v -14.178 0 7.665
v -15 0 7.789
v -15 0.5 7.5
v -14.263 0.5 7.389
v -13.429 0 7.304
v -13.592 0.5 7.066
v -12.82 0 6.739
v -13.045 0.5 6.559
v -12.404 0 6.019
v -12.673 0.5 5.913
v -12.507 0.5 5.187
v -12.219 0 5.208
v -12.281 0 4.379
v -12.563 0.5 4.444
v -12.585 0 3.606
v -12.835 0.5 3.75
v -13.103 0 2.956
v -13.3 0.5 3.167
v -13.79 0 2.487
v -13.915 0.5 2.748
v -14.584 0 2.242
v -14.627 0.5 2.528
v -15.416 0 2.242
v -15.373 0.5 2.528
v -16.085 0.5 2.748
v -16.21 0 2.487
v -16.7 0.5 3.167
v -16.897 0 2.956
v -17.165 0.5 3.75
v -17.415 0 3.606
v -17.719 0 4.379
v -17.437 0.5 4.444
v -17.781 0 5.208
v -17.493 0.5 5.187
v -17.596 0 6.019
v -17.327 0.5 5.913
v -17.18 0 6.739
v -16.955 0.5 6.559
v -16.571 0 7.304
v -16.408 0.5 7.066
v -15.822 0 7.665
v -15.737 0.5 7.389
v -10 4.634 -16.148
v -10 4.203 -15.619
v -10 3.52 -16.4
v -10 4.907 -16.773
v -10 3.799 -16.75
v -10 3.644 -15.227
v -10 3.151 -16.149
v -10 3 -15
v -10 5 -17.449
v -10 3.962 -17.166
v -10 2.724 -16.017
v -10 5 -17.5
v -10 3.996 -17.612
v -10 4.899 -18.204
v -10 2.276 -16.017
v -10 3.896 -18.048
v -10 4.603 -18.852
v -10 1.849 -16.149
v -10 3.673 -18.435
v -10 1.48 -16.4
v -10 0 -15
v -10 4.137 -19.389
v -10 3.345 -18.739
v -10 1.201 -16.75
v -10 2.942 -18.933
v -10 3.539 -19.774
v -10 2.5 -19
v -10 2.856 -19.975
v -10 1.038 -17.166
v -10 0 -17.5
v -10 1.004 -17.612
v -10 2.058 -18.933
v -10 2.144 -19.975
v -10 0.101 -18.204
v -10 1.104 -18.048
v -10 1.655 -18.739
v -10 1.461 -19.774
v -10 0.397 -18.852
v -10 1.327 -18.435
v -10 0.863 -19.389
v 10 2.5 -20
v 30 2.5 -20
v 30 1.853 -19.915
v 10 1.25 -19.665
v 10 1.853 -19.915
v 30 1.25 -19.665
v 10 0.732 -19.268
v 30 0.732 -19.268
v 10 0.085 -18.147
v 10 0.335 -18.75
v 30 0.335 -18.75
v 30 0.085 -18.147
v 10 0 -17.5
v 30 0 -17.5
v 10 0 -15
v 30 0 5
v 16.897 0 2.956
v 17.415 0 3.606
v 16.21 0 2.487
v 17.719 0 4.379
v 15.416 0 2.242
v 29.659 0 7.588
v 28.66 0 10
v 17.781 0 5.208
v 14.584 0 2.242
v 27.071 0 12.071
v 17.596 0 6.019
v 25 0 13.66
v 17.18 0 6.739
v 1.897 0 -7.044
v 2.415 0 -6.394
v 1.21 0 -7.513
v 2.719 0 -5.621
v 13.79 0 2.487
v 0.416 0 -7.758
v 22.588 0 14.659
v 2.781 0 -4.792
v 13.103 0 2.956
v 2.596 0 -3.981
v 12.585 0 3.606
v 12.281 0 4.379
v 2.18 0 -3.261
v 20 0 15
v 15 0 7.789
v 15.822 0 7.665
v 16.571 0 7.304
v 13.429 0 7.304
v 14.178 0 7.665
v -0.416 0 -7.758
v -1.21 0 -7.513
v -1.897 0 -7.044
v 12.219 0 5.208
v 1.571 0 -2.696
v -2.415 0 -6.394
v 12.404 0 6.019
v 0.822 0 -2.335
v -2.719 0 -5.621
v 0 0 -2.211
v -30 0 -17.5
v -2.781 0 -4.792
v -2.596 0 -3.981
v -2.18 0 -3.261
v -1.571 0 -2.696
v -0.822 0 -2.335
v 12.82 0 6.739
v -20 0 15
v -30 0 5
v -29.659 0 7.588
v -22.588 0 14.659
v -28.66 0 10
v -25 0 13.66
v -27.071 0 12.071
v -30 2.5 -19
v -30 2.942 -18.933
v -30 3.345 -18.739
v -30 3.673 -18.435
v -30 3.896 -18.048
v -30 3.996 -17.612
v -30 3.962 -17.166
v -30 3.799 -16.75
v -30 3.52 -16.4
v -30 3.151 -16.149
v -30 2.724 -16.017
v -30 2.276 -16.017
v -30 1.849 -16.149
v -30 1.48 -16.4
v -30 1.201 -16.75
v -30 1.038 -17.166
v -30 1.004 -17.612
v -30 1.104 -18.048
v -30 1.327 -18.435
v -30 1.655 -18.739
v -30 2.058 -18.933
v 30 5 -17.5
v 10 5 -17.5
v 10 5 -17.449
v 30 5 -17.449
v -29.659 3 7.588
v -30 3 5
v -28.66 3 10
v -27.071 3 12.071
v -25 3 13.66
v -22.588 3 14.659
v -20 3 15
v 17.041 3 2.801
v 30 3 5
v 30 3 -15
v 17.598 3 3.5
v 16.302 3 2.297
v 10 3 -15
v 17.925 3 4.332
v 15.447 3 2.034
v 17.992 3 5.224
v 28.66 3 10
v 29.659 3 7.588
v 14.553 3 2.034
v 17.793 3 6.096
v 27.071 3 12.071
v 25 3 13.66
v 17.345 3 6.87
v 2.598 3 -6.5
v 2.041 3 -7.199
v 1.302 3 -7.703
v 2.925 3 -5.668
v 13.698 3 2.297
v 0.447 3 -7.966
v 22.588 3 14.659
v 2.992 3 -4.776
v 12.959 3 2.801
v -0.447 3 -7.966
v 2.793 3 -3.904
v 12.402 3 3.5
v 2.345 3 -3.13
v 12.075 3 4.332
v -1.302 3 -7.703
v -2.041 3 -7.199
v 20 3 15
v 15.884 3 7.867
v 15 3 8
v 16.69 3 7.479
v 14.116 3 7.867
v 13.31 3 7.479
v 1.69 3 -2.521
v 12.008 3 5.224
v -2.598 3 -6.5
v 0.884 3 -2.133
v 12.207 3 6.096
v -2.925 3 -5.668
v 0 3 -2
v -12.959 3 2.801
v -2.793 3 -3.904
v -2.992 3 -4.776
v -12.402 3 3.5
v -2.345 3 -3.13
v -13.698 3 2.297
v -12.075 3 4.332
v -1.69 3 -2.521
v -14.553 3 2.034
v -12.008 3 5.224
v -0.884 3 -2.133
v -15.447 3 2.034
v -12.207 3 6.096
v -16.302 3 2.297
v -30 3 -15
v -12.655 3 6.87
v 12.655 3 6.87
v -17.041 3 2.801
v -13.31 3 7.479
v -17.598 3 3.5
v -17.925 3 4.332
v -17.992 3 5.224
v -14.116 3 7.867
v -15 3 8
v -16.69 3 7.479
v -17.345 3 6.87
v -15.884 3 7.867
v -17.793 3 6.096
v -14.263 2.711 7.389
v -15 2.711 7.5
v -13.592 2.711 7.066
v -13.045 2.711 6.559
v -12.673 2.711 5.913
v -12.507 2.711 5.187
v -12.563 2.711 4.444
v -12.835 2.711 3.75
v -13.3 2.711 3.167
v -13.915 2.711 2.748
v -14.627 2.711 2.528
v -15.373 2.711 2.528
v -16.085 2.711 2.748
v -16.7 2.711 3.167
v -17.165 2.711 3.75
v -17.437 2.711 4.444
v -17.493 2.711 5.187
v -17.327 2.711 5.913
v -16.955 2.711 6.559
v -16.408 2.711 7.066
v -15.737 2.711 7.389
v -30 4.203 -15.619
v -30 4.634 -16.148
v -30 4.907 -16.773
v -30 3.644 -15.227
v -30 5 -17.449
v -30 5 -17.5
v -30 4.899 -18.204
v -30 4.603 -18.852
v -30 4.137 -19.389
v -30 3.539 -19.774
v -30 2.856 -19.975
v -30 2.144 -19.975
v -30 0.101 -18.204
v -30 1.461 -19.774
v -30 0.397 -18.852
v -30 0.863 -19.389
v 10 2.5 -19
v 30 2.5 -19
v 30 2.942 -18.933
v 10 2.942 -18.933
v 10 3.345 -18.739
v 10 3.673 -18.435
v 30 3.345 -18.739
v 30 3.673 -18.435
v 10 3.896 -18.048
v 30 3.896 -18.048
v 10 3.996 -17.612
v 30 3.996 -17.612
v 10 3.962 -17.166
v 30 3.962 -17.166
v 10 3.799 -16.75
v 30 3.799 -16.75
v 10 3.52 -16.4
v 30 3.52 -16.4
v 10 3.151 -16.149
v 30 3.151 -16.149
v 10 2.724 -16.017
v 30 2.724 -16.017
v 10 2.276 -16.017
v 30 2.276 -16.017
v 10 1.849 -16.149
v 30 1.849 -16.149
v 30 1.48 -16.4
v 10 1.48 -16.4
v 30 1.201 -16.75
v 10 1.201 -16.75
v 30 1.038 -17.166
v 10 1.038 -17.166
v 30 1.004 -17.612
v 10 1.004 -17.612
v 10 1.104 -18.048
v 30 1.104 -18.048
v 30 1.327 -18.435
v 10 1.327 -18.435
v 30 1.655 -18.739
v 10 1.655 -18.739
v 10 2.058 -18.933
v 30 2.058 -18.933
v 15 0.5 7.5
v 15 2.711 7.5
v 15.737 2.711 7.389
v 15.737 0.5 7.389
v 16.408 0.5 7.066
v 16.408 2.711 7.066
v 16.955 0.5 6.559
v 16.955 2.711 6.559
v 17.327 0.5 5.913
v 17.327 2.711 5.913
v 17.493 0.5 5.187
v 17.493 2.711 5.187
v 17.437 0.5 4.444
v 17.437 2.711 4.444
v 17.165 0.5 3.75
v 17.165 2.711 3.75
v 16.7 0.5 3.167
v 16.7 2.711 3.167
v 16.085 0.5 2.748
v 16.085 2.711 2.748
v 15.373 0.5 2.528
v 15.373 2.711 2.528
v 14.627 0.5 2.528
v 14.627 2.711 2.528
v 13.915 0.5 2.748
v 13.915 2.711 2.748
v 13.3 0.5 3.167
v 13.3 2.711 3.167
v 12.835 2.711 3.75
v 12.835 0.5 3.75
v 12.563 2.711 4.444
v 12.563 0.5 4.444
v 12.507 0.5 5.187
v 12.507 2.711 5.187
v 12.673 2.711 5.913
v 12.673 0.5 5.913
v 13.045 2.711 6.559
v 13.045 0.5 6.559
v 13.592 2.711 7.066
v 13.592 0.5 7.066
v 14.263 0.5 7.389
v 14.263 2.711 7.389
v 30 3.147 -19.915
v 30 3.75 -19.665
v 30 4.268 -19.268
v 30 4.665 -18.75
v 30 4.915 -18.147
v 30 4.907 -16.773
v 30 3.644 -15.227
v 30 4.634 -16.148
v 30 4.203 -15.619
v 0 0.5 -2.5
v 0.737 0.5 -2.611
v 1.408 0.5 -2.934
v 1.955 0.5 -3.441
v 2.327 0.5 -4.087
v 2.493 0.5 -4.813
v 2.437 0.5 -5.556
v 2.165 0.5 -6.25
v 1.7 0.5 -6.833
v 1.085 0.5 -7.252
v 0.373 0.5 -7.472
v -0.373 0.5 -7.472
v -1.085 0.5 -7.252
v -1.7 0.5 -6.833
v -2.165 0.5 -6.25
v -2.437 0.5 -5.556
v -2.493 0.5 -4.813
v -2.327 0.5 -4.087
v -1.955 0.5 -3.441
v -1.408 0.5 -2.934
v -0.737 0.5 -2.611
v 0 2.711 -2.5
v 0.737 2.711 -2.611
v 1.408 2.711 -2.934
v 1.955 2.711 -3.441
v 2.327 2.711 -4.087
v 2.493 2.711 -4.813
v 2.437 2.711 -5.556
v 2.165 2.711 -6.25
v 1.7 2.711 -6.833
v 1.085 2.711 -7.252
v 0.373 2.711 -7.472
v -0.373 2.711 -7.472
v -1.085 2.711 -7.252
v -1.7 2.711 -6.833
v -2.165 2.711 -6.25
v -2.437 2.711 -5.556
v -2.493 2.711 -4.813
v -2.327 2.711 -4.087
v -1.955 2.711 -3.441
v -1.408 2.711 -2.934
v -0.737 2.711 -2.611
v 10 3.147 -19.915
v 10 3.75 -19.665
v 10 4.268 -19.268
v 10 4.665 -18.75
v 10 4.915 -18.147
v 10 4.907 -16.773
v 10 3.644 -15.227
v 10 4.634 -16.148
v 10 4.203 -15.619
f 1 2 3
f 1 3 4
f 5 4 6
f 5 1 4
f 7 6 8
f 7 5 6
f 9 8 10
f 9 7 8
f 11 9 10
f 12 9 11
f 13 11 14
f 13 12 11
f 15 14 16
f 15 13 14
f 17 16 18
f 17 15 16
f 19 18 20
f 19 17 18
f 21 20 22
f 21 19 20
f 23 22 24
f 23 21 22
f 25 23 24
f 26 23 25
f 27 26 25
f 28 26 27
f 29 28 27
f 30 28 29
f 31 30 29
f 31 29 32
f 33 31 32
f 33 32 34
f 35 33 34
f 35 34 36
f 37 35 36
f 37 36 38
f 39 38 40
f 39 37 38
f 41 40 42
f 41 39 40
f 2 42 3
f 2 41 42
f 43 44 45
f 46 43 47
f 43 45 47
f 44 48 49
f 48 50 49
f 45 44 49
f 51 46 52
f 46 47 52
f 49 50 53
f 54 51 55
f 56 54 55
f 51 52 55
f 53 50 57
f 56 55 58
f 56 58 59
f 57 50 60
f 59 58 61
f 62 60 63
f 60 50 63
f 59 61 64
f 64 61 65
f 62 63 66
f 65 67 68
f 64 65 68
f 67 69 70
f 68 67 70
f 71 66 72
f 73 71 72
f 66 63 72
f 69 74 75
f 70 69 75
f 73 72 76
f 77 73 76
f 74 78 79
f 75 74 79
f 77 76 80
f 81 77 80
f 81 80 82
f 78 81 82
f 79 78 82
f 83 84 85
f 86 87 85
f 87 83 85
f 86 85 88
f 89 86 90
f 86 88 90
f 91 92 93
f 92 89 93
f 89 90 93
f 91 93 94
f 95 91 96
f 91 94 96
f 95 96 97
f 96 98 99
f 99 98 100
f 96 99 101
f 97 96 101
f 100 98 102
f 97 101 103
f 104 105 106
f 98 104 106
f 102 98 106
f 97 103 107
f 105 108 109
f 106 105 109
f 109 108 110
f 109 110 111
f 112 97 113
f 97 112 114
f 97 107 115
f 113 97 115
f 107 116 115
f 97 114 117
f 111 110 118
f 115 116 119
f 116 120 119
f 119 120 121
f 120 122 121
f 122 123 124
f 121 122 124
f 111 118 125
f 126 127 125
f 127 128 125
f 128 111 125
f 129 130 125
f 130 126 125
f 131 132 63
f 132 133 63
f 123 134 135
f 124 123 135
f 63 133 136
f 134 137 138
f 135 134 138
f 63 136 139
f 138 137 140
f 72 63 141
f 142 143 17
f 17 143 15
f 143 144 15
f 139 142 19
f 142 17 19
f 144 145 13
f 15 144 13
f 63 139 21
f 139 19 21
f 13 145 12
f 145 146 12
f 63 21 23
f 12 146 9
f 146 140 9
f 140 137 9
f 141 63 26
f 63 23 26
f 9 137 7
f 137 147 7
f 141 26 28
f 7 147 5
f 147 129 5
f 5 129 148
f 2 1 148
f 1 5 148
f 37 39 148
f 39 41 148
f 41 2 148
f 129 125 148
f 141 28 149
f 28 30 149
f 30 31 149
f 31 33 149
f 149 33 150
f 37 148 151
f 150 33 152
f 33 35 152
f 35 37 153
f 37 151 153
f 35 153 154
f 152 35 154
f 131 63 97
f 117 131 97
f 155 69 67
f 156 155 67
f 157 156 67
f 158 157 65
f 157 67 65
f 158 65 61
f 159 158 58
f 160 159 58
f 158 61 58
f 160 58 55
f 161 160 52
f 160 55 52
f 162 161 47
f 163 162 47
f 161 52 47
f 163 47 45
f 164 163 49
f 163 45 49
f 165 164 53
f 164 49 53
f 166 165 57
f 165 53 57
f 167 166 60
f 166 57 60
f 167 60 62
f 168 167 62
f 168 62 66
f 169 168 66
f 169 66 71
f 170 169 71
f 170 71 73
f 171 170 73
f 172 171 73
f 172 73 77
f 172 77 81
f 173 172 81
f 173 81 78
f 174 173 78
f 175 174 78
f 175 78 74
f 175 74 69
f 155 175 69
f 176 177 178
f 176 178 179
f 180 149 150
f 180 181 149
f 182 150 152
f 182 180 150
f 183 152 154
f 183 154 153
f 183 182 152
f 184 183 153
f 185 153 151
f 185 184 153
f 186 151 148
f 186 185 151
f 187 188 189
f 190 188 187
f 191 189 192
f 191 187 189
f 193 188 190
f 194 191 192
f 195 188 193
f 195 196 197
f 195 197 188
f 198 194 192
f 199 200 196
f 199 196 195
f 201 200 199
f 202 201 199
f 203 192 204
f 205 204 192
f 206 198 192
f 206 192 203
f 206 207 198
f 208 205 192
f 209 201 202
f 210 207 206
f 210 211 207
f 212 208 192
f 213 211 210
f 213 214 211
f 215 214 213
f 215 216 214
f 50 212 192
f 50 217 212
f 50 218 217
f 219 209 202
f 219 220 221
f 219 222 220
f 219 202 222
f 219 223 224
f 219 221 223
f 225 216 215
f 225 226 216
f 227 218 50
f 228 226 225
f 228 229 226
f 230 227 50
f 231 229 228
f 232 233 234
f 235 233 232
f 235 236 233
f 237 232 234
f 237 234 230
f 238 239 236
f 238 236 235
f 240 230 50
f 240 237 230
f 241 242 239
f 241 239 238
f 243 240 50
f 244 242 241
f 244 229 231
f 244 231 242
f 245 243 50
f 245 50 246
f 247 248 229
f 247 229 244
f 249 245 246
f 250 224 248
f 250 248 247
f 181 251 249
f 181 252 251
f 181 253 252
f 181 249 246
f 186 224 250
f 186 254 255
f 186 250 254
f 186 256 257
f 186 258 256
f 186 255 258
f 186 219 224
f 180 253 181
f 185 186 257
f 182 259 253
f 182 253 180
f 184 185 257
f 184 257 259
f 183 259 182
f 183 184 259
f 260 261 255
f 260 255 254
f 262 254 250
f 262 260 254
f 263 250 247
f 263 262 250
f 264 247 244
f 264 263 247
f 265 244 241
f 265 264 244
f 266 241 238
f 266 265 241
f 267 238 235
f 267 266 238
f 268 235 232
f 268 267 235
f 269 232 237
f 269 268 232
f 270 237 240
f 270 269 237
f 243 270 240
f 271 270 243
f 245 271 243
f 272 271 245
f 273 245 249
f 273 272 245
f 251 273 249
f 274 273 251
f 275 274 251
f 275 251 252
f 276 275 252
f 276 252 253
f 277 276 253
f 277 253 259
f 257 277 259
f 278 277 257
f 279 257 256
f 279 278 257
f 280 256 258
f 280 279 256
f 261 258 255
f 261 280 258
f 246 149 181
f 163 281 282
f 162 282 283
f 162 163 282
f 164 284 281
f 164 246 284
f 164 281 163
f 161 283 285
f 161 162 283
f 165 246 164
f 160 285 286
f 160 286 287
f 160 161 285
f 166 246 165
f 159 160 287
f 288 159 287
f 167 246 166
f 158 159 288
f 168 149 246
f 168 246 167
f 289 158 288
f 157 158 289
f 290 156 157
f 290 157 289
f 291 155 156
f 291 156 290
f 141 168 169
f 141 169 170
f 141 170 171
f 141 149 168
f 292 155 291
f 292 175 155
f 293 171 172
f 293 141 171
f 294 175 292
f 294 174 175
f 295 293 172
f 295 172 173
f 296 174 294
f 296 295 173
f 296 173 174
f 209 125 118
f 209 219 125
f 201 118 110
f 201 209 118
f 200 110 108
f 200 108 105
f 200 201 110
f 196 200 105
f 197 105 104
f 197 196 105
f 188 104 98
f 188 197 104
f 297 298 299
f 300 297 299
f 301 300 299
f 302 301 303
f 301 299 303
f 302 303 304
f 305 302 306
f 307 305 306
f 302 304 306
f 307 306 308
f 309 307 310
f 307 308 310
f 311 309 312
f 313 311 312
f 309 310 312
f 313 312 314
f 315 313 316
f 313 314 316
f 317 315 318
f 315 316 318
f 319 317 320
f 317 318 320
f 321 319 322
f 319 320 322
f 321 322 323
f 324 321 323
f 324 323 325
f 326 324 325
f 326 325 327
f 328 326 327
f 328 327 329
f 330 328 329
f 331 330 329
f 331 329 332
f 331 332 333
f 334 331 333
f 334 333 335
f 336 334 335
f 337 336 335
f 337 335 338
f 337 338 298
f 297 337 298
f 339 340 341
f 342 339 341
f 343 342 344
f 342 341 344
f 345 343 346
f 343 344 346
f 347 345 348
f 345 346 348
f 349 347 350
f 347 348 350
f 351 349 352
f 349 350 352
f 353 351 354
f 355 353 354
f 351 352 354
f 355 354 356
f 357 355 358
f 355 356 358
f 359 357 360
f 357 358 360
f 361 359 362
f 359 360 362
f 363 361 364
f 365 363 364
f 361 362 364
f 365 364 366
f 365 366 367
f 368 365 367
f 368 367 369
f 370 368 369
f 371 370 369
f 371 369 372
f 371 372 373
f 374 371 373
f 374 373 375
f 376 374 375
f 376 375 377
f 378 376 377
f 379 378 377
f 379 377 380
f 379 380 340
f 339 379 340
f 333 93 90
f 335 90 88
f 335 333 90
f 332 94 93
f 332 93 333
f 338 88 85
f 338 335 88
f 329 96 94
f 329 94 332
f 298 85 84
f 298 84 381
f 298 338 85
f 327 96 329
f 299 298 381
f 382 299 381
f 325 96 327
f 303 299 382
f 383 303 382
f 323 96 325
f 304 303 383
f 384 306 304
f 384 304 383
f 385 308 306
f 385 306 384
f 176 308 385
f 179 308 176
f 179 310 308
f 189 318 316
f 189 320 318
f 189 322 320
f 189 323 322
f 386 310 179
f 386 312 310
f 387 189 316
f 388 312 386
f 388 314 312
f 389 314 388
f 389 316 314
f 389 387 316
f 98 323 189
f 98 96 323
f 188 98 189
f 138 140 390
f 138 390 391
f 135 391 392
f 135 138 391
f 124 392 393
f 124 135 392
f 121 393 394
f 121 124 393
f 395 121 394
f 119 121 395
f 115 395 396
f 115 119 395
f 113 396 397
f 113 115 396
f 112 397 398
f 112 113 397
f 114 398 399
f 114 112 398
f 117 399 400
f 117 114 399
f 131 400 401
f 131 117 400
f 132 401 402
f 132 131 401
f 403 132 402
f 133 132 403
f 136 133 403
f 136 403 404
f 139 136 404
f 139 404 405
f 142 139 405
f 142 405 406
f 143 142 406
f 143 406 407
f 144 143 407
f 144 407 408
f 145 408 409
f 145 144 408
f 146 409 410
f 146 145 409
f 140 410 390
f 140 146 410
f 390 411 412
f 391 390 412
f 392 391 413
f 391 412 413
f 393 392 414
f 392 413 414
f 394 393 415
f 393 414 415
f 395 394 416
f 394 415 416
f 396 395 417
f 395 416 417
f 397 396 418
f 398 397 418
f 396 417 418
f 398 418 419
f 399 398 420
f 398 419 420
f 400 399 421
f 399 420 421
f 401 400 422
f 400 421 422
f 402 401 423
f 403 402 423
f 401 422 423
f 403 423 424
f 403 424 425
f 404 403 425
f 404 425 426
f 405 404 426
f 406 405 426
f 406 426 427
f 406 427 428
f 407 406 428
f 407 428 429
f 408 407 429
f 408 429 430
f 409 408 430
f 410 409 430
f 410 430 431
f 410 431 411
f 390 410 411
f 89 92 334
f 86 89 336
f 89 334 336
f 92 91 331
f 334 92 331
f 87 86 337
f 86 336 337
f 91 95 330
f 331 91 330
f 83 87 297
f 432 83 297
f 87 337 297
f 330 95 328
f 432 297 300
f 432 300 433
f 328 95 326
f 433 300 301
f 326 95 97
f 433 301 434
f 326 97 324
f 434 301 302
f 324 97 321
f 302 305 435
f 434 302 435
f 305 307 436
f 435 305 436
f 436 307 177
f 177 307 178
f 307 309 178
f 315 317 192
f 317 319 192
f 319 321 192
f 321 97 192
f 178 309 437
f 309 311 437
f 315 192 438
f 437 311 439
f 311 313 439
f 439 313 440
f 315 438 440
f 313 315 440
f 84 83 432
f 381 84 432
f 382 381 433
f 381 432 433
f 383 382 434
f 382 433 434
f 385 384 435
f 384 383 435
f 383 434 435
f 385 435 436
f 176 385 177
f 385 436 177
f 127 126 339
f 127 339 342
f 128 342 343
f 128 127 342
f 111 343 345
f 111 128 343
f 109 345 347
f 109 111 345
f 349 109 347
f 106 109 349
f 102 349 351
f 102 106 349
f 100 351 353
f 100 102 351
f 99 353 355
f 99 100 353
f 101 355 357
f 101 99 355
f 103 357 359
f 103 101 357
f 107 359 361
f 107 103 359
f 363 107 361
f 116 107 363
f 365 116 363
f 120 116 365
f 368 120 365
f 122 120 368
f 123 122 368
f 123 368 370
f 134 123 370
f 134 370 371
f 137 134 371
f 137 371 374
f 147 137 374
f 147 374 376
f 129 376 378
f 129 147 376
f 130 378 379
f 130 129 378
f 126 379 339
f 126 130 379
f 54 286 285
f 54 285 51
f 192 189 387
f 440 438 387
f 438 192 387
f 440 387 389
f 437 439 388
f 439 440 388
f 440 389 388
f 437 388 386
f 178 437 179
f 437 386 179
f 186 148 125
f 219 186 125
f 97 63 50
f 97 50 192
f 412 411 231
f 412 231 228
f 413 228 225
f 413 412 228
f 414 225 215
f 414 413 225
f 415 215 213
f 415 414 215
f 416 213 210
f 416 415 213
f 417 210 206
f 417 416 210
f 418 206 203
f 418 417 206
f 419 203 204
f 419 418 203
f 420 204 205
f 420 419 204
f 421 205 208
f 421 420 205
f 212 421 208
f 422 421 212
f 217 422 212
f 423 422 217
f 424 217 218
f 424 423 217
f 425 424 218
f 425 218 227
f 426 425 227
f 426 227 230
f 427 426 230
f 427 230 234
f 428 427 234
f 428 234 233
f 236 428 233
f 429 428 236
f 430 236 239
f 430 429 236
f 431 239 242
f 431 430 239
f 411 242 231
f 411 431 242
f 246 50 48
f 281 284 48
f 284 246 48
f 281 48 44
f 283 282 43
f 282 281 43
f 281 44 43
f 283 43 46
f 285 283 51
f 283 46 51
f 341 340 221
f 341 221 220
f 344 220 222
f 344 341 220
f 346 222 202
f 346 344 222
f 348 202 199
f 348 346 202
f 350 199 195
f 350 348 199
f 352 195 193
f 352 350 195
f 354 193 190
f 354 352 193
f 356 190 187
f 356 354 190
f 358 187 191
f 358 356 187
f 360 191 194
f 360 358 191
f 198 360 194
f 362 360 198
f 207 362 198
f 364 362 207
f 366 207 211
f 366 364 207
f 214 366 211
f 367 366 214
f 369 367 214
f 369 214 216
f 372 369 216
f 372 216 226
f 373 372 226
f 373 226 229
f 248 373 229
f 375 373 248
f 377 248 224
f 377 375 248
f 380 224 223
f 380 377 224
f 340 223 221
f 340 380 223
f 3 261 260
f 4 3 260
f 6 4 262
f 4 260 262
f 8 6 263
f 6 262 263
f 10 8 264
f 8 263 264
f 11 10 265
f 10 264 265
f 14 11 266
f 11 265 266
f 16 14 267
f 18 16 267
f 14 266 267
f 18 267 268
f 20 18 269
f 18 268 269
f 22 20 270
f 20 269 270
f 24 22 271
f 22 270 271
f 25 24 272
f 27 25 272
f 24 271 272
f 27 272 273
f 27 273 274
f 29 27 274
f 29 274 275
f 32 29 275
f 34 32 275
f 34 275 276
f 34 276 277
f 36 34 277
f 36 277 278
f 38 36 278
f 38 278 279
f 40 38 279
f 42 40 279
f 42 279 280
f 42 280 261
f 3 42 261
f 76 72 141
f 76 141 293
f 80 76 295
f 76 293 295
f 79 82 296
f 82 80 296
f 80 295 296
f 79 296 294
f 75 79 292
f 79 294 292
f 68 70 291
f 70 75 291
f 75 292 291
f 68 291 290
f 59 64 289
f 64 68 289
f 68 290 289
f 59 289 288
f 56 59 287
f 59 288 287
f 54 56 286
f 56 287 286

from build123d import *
from OCP.BRepFilletAPI import BRepFilletAPI_MakeChamfer

# Parameters (mm, degrees)
SZKIC1_W                    = 60
SZKIC1_H                    = 30
DODANIE_WYCI_GNI_CIE1_DEPTH = 3
SZKIC2_R                    = 2.5
WYTNIJ_WYCI_GNI_CIE1_DEPTH  = 5
SZKIC4_W                    = 20
SZKIC4_H                    = 3
DODANIE_WYCI_GNI_CIE2_DEPTH = 5
SZKIC5_W                    = 20
SZKIC5_H                    = 5
DODANIE_WYCI_GNI_CIE3_DEPTH = 2
ZAOKR_GLENIE1_R             = 2.5
SZKIC6_R                    = 1.5
WYTNIJ_WYCI_GNI_CIE2_DEPTH  = 60
ZAOKR_GLENIE2_R             = 10
SFAZOWANIE1_SIZE            = 0.5
SFAZOWANIE1_SIZE2           = 0.288675135


with BuildPart() as part:
    # Szkic1 → Dodanie-wyciągnięcie1 (new body)
    with BuildSketch(Plane(origin=(0, 0, 0), x_dir=(1, 0, 0), z_dir=(0, 1, 0))):
        Rectangle(SZKIC1_W, SZKIC1_H)
    extrude(amount=DODANIE_WYCI_GNI_CIE1_DEPTH)

    # Szkic2 → Wytnij-wyciągnięcie1 (cut)
    with BuildSketch(Plane(origin=(0, 3, 0), x_dir=(1, 0, 0), z_dir=(0, 1, 0))):
        with Locations(Location((-15, -5, 0), (0, 0, 270))):
            Circle(SZKIC2_R)
        with Locations(Location((15, -5, 0), (0, 0, 270))):
            Circle(SZKIC2_R)
        with Locations(Location((0, 5, 0), (0, 0, 270))):
            Circle(SZKIC2_R)
    extrude(amount=-WYTNIJ_WYCI_GNI_CIE1_DEPTH, mode=Mode.SUBTRACT)

    # Szkic4 → Dodanie-wyciągnięcie2 (add)
    with BuildSketch(Plane(origin=(0, 0, -15), x_dir=(-1, 0, 0), z_dir=(0, 0, -1))):
        with Locations((-20, 1.5)):
            Rectangle(SZKIC4_W, SZKIC4_H)
        with Locations((20, 1.5)):
            Rectangle(SZKIC4_W, SZKIC4_H)
    extrude(amount=DODANIE_WYCI_GNI_CIE2_DEPTH)

    # Szkic5 → Dodanie-wyciągnięcie3 (add)
    with BuildSketch(Plane(origin=(0, 3, 0), x_dir=(1, 0, 0), z_dir=(0, 1, 0))):
        with Locations((-20, 17.5)):
            Rectangle(SZKIC5_W, SZKIC5_H)
        with Locations((20, 17.5)):
            Rectangle(SZKIC5_W, SZKIC5_H)
    extrude(amount=DODANIE_WYCI_GNI_CIE3_DEPTH)

    # Zaokrąglenie1
    # the kernel refuses this fillet: 2.5 mm, written as the material it takes off along each edge
    with BuildSketch(Plane(origin=(-36.25, 0, -20), x_dir=(0, 1, 0), z_dir=(1, 0, 0)), Plane(origin=(-36.25, 5, -20), x_dir=(0, 0, 1), z_dir=(1, 0, 0)), Plane(origin=(3.75, 5, -20), x_dir=(0, 0, 1), z_dir=(1, 0, 0))) as zaokr_glenie1_piece_1:
        with BuildLine():
            CenterArc((ZAOKR_GLENIE1_R, ZAOKR_GLENIE1_R), ZAOKR_GLENIE1_R, 180, 90)
            Line((0, ZAOKR_GLENIE1_R), (-ZAOKR_GLENIE1_R * 0.02, ZAOKR_GLENIE1_R))
            Line((-ZAOKR_GLENIE1_R * 0.02, ZAOKR_GLENIE1_R), (-ZAOKR_GLENIE1_R * 0.02, -ZAOKR_GLENIE1_R * 0.02))
            Line((-ZAOKR_GLENIE1_R * 0.02, -ZAOKR_GLENIE1_R * 0.02), (ZAOKR_GLENIE1_R, -ZAOKR_GLENIE1_R * 0.02))
            Line((ZAOKR_GLENIE1_R, -ZAOKR_GLENIE1_R * 0.02), (ZAOKR_GLENIE1_R, 0))
        make_face()
    extrude(amount=32.5, mode=Mode.SUBTRACT)
    with BuildSketch(Plane(origin=(-3.876275643, 5, -15), x_dir=(0, -1.0, -1.666222715356868e-12), z_dir=(-1, 0, 0)), Plane(origin=(36.123724357, 5, -15), x_dir=(0, -1.0, -1.666222715356868e-12), z_dir=(-1, 0, 0))) as zaokr_glenie1_piece_2:
        with BuildLine():
            CenterArc((2.5, -2.449489743), ZAOKR_GLENIE1_R, 101.536959033, 78.463040967)
            Line((0, -2.449489743), (-0.05, -2.449489743))
            Line((-0.05, -2.449489743), (-0.05, 0))
            Line((-0.05, 0), (0, 0.05))
            ThreePointArc((0, 0.05), (1, 0.05), (1.99, 0.048989795))
            Line((1.99, 0.048989795), (2, 0))
        make_face()
    extrude(amount=32.247448714, mode=Mode.SUBTRACT)
    with BuildSketch(Plane(origin=(36.25, 0, -20), x_dir=(0, 1, 0), z_dir=(-1, 0, 0))) as zaokr_glenie1_piece_3:
        with BuildLine():
            CenterArc((ZAOKR_GLENIE1_R, -ZAOKR_GLENIE1_R), ZAOKR_GLENIE1_R, 90, 90)
            Line((0, -ZAOKR_GLENIE1_R), (-ZAOKR_GLENIE1_R * 0.02, -ZAOKR_GLENIE1_R))
            Line((-ZAOKR_GLENIE1_R * 0.02, -ZAOKR_GLENIE1_R), (-ZAOKR_GLENIE1_R * 0.02, ZAOKR_GLENIE1_R * 0.02))
            Line((-ZAOKR_GLENIE1_R * 0.02, ZAOKR_GLENIE1_R * 0.02), (ZAOKR_GLENIE1_R, ZAOKR_GLENIE1_R * 0.02))
            Line((ZAOKR_GLENIE1_R, ZAOKR_GLENIE1_R * 0.02), (ZAOKR_GLENIE1_R, 0))
        make_face()
    extrude(amount=32.5, mode=Mode.SUBTRACT)

    # Szkic6 → Wytnij-wyciągnięcie2 (cut)
    with BuildSketch(Plane(origin=(30, 0, 0), x_dir=(0, 0, -1), z_dir=(1, 0, 0))):
        with Locations((17.5, 2.5)):
            Circle(SZKIC6_R)
    extrude(amount=-WYTNIJ_WYCI_GNI_CIE2_DEPTH, mode=Mode.SUBTRACT)

    # Zaokrąglenie2
    zaokr_glenie2_edges = [part.edges().sort_by_distance(p)[0] for p in [
        (30, 1.5, 15),
        (-30, 1.5, 15),
    ]]
    fillet(zaokr_glenie2_edges, radius=ZAOKR_GLENIE2_R)

    # Sfazowanie1: one chamfer whose edges measure the first distance from different faces: ONE call of the kernel's chamfer builder (chamfer() names one face for all edges)
    sfazowanie1_edges_1 = [part.edges().sort_by_distance(p)[0] for p in [
        (-15, 0, 2.5),
    ]]
    sfazowanie1_side_1 = [part.faces().sort_by_distance(p)[0] for p in [
        (-15, 1.5, 2.5),
    ]]
    sfazowanie1_edges_2 = [part.edges().sort_by_distance(p)[0] for p in [
        (-15, 3, 2.5),
        (15, 3, 2.5),
        (0, 3, -7.5),
    ]]
    sfazowanie1_side_2 = [part.faces().sort_by_distance(p)[0] for p in [
        (0, 3, -0.380473171),
    ]]
    sfazowanie1_edges_3 = [part.edges().sort_by_distance(p)[0] for p in [
        (15, 0, 2.5),
    ]]
    sfazowanie1_side_3 = [part.faces().sort_by_distance(p)[0] for p in [
        (15, 1.5, 2.5),
    ]]
    sfazowanie1_edges_4 = [part.edges().sort_by_distance(p)[0] for p in [
        (0, 0, -7.5),
    ]]
    sfazowanie1_side_4 = [part.faces().sort_by_distance(p)[0] for p in [
        (0, 1.5, -7.5),
    ]]
    sfazowanie1 = BRepFilletAPI_MakeChamfer(part.part.solid().wrapped)
    for e in sfazowanie1_edges_1:
        sfazowanie1.Add(SFAZOWANIE1_SIZE, SFAZOWANIE1_SIZE2, e.wrapped, sfazowanie1_side_1[0].wrapped)  # the first distance lies on this face
    for e in sfazowanie1_edges_2:
        sfazowanie1.Add(SFAZOWANIE1_SIZE, SFAZOWANIE1_SIZE2, e.wrapped, sfazowanie1_side_2[0].wrapped)  # the first distance lies on this face
    for e in sfazowanie1_edges_3:
        sfazowanie1.Add(SFAZOWANIE1_SIZE, SFAZOWANIE1_SIZE2, e.wrapped, sfazowanie1_side_3[0].wrapped)  # the first distance lies on this face
    for e in sfazowanie1_edges_4:
        sfazowanie1.Add(SFAZOWANIE1_SIZE, SFAZOWANIE1_SIZE2, e.wrapped, sfazowanie1_side_4[0].wrapped)  # the first distance lies on this face
    add(Compound.cast(sfazowanie1.Shape()), mode=Mode.REPLACE)


solid = part.part
